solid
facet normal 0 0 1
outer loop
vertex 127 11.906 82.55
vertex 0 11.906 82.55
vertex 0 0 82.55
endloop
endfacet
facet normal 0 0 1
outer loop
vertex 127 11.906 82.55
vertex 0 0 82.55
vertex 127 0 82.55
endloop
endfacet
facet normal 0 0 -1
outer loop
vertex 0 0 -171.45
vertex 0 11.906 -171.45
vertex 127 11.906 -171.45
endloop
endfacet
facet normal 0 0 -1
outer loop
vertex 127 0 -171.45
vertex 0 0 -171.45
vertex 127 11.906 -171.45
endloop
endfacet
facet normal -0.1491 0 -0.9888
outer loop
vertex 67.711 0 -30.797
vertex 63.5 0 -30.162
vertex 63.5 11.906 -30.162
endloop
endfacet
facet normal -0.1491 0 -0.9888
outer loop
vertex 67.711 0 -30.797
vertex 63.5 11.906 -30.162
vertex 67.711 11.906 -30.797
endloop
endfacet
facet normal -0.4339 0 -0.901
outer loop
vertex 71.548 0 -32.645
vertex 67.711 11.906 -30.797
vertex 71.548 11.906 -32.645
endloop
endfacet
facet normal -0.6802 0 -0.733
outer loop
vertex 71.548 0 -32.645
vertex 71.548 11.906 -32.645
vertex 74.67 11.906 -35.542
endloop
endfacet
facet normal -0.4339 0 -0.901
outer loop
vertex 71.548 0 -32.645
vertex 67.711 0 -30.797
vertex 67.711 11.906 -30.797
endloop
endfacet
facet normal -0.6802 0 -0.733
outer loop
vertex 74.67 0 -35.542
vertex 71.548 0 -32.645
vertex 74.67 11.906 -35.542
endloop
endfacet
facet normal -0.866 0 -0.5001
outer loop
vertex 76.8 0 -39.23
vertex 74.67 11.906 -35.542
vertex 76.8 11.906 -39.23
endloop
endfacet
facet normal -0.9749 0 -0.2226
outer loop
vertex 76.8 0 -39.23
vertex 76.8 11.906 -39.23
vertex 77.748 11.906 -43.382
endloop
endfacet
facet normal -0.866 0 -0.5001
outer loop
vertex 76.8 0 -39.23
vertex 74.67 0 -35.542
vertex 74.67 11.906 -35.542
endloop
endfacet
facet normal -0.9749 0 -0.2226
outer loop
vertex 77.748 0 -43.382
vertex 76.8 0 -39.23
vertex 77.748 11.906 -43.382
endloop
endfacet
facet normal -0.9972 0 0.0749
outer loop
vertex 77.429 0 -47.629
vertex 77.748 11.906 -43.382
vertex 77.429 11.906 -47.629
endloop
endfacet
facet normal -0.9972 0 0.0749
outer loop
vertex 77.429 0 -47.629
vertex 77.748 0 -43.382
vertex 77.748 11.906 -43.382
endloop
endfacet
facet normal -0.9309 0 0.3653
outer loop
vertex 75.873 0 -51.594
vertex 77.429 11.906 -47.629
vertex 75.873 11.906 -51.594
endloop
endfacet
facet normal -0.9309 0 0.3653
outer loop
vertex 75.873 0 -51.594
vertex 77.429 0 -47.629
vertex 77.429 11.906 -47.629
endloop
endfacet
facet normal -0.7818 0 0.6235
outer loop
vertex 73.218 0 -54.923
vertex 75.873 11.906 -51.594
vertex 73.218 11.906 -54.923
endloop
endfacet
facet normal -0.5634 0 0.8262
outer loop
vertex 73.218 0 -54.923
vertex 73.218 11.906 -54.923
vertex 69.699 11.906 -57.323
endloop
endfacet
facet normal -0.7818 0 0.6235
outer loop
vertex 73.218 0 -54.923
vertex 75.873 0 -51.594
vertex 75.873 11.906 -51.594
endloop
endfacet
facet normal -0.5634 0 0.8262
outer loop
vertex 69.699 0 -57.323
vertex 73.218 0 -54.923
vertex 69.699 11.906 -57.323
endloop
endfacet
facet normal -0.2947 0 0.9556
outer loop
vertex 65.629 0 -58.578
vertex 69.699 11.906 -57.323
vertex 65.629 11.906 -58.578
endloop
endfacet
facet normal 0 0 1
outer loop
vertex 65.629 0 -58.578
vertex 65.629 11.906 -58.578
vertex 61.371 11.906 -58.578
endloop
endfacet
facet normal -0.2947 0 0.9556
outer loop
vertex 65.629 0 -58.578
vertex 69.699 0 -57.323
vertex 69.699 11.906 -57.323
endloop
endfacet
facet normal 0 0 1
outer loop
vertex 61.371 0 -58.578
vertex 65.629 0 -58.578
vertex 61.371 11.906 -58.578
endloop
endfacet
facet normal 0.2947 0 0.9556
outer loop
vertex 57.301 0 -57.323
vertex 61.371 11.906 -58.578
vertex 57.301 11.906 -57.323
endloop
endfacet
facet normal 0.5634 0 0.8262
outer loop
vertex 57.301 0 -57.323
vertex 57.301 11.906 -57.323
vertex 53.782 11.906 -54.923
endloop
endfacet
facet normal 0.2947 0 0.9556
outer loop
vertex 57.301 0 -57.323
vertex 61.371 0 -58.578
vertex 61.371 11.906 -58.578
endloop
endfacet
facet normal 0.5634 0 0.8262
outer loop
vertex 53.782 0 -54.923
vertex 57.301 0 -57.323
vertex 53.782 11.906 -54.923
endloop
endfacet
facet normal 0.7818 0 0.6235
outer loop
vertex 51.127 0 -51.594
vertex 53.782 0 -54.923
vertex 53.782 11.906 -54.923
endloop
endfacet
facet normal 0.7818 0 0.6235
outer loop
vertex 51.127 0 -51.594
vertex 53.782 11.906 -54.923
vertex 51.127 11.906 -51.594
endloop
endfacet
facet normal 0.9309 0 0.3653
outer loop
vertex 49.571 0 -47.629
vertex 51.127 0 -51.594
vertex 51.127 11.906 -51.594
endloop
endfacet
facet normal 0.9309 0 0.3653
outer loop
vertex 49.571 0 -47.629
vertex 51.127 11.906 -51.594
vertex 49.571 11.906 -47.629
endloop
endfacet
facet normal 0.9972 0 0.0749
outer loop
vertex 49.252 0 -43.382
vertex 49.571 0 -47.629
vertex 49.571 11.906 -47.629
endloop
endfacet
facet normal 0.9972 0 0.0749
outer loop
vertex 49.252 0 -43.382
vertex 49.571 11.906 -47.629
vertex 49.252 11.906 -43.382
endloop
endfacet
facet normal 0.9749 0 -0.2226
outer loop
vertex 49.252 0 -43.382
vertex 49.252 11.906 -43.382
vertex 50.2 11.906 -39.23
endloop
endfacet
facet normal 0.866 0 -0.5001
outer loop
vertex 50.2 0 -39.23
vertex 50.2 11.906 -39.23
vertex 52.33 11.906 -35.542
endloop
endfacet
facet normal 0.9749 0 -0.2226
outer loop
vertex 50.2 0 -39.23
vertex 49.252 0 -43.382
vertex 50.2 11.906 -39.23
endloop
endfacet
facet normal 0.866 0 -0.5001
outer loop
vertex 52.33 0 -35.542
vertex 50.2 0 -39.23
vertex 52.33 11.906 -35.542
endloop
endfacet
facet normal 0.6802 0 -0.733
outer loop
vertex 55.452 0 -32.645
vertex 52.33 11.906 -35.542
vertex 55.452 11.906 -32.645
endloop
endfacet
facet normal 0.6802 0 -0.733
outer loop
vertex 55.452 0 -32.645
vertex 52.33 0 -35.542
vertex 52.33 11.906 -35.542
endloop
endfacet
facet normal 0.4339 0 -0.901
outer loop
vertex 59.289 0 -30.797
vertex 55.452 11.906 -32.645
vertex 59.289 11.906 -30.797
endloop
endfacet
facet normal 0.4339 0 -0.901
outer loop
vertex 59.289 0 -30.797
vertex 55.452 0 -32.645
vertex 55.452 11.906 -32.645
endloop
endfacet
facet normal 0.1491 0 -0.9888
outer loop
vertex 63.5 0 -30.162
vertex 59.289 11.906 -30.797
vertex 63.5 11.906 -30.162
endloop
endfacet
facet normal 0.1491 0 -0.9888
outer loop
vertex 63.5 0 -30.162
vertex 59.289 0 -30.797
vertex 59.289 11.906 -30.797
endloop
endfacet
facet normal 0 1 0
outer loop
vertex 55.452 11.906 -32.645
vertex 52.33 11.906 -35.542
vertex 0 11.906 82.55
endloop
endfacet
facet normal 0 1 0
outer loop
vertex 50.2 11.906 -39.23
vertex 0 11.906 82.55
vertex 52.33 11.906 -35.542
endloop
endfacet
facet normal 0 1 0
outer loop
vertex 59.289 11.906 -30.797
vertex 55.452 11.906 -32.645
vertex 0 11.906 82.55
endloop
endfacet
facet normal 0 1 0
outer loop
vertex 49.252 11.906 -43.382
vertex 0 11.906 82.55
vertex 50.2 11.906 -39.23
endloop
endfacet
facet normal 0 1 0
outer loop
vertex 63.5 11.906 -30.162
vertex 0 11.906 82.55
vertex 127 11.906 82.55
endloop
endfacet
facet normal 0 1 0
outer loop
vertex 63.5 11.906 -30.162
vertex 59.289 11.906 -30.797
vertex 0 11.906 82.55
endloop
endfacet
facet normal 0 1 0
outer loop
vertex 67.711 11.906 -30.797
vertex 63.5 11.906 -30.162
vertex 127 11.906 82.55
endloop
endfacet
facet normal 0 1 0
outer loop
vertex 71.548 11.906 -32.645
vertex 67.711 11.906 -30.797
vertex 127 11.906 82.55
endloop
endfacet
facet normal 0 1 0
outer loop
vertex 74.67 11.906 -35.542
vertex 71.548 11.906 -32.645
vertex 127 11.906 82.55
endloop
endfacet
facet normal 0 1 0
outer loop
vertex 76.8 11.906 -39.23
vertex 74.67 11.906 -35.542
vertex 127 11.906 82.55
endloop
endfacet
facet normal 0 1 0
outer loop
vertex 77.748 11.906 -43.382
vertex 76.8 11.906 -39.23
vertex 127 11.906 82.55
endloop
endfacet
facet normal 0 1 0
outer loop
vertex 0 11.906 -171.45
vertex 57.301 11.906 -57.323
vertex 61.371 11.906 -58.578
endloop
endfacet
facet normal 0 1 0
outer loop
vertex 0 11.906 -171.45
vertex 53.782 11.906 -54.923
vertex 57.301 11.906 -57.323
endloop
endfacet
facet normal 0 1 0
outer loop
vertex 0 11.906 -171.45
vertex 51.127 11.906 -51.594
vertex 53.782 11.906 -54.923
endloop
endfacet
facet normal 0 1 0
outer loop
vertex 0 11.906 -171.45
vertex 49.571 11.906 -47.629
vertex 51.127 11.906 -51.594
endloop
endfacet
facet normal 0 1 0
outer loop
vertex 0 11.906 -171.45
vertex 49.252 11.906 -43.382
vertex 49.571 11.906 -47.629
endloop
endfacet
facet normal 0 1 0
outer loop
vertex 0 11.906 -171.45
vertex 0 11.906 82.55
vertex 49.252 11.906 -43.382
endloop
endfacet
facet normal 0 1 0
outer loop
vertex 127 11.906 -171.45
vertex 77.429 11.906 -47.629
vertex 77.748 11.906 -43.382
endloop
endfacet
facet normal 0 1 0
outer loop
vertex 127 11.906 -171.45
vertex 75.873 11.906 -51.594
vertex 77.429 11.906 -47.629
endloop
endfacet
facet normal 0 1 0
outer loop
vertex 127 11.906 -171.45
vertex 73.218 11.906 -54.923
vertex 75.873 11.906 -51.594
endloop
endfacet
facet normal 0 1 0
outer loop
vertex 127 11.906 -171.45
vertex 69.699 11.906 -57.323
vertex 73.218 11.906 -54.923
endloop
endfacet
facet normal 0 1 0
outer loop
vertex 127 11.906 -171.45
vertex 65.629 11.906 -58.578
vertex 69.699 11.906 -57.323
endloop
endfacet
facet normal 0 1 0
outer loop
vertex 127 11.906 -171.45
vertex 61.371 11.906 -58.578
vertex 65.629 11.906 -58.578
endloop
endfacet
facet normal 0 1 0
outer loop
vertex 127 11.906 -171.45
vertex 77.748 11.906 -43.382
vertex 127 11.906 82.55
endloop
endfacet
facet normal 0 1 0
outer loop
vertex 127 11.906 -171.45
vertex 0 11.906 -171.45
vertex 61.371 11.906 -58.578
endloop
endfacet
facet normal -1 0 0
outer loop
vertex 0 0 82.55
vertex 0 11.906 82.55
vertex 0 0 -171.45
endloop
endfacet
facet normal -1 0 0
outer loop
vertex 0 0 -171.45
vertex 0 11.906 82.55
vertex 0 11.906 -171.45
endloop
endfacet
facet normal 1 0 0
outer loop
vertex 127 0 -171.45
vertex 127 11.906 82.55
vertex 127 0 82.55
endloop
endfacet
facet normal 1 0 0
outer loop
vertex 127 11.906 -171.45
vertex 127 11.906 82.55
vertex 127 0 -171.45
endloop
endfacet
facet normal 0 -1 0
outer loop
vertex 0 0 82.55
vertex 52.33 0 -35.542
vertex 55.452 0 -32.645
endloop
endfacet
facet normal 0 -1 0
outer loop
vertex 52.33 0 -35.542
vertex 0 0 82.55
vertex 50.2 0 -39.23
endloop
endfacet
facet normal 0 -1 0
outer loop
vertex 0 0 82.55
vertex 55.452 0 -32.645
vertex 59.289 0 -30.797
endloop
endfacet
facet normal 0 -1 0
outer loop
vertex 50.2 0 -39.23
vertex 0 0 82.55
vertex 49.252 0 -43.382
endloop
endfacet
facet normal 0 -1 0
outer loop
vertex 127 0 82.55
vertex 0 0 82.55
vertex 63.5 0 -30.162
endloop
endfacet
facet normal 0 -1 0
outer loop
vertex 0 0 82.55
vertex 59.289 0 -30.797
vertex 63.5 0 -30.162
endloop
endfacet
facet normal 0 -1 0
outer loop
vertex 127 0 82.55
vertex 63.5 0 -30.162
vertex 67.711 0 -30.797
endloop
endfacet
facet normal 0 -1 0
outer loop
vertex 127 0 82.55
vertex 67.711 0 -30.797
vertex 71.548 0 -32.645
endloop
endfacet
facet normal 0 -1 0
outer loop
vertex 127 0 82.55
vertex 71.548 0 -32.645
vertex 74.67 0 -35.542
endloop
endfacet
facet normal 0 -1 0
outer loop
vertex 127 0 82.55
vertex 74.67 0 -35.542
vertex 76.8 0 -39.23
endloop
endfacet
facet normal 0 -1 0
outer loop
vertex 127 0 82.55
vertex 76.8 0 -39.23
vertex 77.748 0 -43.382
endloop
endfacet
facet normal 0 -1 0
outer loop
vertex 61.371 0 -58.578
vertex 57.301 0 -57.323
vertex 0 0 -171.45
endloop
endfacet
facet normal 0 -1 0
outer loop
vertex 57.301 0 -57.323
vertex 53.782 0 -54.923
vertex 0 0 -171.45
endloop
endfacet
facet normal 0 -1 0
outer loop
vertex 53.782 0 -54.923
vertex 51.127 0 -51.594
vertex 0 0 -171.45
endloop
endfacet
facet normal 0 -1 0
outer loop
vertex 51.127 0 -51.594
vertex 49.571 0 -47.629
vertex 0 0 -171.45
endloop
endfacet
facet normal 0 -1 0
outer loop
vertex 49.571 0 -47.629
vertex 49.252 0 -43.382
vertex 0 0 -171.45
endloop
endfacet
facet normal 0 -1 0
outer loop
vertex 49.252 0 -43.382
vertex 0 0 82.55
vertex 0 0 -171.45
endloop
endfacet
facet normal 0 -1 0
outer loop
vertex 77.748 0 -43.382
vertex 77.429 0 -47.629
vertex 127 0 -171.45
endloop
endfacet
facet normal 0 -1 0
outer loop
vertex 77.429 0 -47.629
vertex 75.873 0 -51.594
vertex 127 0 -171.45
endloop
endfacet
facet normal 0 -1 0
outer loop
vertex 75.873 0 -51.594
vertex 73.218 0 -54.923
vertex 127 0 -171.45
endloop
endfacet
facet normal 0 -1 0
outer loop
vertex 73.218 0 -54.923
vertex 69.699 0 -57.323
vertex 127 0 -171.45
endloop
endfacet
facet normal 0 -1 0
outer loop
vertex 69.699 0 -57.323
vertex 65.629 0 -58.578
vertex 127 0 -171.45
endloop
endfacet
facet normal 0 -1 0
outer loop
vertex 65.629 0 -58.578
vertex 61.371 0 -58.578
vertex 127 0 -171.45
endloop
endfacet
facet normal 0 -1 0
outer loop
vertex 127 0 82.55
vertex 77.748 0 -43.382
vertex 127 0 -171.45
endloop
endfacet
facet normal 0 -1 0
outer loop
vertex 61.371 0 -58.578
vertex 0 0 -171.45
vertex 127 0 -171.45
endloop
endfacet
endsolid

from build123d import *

# Parameters (mm, degrees)
SKETCH1_W           = 127
SKETCH1_H           = 88.9
SKETCH1_R           = 14.2875
BOSS_EXTRUDE1_DEPTH = 11.90625
SKETCH2_W           = 127
SKETCH2_H           = 82.55
BOSS_EXTRUDE2_DEPTH = 11.90625


with BuildPart() as part:
    # Sketch1 → Boss-Extrude1 (new body)
    with BuildSketch(Plane(origin=(0, 0, 0), x_dir=(1, 0, 0), z_dir=(0, 1, 0))):
        with Locations((63.5, 44.45)):
            Rectangle(SKETCH1_W, SKETCH1_H)
        with Locations(Location((63.5, 44.45, 0), (0, 0, 270))):
            Circle(SKETCH1_R, mode=Mode.SUBTRACT)
    extrude(amount=BOSS_EXTRUDE1_DEPTH)

    # Sketch2 → Boss-Extrude2 (add)
    with BuildSketch(Plane(origin=(0, 11.90625, 0), x_dir=(1, 0, 0), z_dir=(0, 1, 0))):
        with Locations((63.5, 130.175)):
            Rectangle(SKETCH2_W, SKETCH2_H)
        with Locations((63.5, -41.275)):
            Rectangle(SKETCH2_W, SKETCH2_H)
    extrude(amount=-BOSS_EXTRUDE2_DEPTH)


solid = part.part
